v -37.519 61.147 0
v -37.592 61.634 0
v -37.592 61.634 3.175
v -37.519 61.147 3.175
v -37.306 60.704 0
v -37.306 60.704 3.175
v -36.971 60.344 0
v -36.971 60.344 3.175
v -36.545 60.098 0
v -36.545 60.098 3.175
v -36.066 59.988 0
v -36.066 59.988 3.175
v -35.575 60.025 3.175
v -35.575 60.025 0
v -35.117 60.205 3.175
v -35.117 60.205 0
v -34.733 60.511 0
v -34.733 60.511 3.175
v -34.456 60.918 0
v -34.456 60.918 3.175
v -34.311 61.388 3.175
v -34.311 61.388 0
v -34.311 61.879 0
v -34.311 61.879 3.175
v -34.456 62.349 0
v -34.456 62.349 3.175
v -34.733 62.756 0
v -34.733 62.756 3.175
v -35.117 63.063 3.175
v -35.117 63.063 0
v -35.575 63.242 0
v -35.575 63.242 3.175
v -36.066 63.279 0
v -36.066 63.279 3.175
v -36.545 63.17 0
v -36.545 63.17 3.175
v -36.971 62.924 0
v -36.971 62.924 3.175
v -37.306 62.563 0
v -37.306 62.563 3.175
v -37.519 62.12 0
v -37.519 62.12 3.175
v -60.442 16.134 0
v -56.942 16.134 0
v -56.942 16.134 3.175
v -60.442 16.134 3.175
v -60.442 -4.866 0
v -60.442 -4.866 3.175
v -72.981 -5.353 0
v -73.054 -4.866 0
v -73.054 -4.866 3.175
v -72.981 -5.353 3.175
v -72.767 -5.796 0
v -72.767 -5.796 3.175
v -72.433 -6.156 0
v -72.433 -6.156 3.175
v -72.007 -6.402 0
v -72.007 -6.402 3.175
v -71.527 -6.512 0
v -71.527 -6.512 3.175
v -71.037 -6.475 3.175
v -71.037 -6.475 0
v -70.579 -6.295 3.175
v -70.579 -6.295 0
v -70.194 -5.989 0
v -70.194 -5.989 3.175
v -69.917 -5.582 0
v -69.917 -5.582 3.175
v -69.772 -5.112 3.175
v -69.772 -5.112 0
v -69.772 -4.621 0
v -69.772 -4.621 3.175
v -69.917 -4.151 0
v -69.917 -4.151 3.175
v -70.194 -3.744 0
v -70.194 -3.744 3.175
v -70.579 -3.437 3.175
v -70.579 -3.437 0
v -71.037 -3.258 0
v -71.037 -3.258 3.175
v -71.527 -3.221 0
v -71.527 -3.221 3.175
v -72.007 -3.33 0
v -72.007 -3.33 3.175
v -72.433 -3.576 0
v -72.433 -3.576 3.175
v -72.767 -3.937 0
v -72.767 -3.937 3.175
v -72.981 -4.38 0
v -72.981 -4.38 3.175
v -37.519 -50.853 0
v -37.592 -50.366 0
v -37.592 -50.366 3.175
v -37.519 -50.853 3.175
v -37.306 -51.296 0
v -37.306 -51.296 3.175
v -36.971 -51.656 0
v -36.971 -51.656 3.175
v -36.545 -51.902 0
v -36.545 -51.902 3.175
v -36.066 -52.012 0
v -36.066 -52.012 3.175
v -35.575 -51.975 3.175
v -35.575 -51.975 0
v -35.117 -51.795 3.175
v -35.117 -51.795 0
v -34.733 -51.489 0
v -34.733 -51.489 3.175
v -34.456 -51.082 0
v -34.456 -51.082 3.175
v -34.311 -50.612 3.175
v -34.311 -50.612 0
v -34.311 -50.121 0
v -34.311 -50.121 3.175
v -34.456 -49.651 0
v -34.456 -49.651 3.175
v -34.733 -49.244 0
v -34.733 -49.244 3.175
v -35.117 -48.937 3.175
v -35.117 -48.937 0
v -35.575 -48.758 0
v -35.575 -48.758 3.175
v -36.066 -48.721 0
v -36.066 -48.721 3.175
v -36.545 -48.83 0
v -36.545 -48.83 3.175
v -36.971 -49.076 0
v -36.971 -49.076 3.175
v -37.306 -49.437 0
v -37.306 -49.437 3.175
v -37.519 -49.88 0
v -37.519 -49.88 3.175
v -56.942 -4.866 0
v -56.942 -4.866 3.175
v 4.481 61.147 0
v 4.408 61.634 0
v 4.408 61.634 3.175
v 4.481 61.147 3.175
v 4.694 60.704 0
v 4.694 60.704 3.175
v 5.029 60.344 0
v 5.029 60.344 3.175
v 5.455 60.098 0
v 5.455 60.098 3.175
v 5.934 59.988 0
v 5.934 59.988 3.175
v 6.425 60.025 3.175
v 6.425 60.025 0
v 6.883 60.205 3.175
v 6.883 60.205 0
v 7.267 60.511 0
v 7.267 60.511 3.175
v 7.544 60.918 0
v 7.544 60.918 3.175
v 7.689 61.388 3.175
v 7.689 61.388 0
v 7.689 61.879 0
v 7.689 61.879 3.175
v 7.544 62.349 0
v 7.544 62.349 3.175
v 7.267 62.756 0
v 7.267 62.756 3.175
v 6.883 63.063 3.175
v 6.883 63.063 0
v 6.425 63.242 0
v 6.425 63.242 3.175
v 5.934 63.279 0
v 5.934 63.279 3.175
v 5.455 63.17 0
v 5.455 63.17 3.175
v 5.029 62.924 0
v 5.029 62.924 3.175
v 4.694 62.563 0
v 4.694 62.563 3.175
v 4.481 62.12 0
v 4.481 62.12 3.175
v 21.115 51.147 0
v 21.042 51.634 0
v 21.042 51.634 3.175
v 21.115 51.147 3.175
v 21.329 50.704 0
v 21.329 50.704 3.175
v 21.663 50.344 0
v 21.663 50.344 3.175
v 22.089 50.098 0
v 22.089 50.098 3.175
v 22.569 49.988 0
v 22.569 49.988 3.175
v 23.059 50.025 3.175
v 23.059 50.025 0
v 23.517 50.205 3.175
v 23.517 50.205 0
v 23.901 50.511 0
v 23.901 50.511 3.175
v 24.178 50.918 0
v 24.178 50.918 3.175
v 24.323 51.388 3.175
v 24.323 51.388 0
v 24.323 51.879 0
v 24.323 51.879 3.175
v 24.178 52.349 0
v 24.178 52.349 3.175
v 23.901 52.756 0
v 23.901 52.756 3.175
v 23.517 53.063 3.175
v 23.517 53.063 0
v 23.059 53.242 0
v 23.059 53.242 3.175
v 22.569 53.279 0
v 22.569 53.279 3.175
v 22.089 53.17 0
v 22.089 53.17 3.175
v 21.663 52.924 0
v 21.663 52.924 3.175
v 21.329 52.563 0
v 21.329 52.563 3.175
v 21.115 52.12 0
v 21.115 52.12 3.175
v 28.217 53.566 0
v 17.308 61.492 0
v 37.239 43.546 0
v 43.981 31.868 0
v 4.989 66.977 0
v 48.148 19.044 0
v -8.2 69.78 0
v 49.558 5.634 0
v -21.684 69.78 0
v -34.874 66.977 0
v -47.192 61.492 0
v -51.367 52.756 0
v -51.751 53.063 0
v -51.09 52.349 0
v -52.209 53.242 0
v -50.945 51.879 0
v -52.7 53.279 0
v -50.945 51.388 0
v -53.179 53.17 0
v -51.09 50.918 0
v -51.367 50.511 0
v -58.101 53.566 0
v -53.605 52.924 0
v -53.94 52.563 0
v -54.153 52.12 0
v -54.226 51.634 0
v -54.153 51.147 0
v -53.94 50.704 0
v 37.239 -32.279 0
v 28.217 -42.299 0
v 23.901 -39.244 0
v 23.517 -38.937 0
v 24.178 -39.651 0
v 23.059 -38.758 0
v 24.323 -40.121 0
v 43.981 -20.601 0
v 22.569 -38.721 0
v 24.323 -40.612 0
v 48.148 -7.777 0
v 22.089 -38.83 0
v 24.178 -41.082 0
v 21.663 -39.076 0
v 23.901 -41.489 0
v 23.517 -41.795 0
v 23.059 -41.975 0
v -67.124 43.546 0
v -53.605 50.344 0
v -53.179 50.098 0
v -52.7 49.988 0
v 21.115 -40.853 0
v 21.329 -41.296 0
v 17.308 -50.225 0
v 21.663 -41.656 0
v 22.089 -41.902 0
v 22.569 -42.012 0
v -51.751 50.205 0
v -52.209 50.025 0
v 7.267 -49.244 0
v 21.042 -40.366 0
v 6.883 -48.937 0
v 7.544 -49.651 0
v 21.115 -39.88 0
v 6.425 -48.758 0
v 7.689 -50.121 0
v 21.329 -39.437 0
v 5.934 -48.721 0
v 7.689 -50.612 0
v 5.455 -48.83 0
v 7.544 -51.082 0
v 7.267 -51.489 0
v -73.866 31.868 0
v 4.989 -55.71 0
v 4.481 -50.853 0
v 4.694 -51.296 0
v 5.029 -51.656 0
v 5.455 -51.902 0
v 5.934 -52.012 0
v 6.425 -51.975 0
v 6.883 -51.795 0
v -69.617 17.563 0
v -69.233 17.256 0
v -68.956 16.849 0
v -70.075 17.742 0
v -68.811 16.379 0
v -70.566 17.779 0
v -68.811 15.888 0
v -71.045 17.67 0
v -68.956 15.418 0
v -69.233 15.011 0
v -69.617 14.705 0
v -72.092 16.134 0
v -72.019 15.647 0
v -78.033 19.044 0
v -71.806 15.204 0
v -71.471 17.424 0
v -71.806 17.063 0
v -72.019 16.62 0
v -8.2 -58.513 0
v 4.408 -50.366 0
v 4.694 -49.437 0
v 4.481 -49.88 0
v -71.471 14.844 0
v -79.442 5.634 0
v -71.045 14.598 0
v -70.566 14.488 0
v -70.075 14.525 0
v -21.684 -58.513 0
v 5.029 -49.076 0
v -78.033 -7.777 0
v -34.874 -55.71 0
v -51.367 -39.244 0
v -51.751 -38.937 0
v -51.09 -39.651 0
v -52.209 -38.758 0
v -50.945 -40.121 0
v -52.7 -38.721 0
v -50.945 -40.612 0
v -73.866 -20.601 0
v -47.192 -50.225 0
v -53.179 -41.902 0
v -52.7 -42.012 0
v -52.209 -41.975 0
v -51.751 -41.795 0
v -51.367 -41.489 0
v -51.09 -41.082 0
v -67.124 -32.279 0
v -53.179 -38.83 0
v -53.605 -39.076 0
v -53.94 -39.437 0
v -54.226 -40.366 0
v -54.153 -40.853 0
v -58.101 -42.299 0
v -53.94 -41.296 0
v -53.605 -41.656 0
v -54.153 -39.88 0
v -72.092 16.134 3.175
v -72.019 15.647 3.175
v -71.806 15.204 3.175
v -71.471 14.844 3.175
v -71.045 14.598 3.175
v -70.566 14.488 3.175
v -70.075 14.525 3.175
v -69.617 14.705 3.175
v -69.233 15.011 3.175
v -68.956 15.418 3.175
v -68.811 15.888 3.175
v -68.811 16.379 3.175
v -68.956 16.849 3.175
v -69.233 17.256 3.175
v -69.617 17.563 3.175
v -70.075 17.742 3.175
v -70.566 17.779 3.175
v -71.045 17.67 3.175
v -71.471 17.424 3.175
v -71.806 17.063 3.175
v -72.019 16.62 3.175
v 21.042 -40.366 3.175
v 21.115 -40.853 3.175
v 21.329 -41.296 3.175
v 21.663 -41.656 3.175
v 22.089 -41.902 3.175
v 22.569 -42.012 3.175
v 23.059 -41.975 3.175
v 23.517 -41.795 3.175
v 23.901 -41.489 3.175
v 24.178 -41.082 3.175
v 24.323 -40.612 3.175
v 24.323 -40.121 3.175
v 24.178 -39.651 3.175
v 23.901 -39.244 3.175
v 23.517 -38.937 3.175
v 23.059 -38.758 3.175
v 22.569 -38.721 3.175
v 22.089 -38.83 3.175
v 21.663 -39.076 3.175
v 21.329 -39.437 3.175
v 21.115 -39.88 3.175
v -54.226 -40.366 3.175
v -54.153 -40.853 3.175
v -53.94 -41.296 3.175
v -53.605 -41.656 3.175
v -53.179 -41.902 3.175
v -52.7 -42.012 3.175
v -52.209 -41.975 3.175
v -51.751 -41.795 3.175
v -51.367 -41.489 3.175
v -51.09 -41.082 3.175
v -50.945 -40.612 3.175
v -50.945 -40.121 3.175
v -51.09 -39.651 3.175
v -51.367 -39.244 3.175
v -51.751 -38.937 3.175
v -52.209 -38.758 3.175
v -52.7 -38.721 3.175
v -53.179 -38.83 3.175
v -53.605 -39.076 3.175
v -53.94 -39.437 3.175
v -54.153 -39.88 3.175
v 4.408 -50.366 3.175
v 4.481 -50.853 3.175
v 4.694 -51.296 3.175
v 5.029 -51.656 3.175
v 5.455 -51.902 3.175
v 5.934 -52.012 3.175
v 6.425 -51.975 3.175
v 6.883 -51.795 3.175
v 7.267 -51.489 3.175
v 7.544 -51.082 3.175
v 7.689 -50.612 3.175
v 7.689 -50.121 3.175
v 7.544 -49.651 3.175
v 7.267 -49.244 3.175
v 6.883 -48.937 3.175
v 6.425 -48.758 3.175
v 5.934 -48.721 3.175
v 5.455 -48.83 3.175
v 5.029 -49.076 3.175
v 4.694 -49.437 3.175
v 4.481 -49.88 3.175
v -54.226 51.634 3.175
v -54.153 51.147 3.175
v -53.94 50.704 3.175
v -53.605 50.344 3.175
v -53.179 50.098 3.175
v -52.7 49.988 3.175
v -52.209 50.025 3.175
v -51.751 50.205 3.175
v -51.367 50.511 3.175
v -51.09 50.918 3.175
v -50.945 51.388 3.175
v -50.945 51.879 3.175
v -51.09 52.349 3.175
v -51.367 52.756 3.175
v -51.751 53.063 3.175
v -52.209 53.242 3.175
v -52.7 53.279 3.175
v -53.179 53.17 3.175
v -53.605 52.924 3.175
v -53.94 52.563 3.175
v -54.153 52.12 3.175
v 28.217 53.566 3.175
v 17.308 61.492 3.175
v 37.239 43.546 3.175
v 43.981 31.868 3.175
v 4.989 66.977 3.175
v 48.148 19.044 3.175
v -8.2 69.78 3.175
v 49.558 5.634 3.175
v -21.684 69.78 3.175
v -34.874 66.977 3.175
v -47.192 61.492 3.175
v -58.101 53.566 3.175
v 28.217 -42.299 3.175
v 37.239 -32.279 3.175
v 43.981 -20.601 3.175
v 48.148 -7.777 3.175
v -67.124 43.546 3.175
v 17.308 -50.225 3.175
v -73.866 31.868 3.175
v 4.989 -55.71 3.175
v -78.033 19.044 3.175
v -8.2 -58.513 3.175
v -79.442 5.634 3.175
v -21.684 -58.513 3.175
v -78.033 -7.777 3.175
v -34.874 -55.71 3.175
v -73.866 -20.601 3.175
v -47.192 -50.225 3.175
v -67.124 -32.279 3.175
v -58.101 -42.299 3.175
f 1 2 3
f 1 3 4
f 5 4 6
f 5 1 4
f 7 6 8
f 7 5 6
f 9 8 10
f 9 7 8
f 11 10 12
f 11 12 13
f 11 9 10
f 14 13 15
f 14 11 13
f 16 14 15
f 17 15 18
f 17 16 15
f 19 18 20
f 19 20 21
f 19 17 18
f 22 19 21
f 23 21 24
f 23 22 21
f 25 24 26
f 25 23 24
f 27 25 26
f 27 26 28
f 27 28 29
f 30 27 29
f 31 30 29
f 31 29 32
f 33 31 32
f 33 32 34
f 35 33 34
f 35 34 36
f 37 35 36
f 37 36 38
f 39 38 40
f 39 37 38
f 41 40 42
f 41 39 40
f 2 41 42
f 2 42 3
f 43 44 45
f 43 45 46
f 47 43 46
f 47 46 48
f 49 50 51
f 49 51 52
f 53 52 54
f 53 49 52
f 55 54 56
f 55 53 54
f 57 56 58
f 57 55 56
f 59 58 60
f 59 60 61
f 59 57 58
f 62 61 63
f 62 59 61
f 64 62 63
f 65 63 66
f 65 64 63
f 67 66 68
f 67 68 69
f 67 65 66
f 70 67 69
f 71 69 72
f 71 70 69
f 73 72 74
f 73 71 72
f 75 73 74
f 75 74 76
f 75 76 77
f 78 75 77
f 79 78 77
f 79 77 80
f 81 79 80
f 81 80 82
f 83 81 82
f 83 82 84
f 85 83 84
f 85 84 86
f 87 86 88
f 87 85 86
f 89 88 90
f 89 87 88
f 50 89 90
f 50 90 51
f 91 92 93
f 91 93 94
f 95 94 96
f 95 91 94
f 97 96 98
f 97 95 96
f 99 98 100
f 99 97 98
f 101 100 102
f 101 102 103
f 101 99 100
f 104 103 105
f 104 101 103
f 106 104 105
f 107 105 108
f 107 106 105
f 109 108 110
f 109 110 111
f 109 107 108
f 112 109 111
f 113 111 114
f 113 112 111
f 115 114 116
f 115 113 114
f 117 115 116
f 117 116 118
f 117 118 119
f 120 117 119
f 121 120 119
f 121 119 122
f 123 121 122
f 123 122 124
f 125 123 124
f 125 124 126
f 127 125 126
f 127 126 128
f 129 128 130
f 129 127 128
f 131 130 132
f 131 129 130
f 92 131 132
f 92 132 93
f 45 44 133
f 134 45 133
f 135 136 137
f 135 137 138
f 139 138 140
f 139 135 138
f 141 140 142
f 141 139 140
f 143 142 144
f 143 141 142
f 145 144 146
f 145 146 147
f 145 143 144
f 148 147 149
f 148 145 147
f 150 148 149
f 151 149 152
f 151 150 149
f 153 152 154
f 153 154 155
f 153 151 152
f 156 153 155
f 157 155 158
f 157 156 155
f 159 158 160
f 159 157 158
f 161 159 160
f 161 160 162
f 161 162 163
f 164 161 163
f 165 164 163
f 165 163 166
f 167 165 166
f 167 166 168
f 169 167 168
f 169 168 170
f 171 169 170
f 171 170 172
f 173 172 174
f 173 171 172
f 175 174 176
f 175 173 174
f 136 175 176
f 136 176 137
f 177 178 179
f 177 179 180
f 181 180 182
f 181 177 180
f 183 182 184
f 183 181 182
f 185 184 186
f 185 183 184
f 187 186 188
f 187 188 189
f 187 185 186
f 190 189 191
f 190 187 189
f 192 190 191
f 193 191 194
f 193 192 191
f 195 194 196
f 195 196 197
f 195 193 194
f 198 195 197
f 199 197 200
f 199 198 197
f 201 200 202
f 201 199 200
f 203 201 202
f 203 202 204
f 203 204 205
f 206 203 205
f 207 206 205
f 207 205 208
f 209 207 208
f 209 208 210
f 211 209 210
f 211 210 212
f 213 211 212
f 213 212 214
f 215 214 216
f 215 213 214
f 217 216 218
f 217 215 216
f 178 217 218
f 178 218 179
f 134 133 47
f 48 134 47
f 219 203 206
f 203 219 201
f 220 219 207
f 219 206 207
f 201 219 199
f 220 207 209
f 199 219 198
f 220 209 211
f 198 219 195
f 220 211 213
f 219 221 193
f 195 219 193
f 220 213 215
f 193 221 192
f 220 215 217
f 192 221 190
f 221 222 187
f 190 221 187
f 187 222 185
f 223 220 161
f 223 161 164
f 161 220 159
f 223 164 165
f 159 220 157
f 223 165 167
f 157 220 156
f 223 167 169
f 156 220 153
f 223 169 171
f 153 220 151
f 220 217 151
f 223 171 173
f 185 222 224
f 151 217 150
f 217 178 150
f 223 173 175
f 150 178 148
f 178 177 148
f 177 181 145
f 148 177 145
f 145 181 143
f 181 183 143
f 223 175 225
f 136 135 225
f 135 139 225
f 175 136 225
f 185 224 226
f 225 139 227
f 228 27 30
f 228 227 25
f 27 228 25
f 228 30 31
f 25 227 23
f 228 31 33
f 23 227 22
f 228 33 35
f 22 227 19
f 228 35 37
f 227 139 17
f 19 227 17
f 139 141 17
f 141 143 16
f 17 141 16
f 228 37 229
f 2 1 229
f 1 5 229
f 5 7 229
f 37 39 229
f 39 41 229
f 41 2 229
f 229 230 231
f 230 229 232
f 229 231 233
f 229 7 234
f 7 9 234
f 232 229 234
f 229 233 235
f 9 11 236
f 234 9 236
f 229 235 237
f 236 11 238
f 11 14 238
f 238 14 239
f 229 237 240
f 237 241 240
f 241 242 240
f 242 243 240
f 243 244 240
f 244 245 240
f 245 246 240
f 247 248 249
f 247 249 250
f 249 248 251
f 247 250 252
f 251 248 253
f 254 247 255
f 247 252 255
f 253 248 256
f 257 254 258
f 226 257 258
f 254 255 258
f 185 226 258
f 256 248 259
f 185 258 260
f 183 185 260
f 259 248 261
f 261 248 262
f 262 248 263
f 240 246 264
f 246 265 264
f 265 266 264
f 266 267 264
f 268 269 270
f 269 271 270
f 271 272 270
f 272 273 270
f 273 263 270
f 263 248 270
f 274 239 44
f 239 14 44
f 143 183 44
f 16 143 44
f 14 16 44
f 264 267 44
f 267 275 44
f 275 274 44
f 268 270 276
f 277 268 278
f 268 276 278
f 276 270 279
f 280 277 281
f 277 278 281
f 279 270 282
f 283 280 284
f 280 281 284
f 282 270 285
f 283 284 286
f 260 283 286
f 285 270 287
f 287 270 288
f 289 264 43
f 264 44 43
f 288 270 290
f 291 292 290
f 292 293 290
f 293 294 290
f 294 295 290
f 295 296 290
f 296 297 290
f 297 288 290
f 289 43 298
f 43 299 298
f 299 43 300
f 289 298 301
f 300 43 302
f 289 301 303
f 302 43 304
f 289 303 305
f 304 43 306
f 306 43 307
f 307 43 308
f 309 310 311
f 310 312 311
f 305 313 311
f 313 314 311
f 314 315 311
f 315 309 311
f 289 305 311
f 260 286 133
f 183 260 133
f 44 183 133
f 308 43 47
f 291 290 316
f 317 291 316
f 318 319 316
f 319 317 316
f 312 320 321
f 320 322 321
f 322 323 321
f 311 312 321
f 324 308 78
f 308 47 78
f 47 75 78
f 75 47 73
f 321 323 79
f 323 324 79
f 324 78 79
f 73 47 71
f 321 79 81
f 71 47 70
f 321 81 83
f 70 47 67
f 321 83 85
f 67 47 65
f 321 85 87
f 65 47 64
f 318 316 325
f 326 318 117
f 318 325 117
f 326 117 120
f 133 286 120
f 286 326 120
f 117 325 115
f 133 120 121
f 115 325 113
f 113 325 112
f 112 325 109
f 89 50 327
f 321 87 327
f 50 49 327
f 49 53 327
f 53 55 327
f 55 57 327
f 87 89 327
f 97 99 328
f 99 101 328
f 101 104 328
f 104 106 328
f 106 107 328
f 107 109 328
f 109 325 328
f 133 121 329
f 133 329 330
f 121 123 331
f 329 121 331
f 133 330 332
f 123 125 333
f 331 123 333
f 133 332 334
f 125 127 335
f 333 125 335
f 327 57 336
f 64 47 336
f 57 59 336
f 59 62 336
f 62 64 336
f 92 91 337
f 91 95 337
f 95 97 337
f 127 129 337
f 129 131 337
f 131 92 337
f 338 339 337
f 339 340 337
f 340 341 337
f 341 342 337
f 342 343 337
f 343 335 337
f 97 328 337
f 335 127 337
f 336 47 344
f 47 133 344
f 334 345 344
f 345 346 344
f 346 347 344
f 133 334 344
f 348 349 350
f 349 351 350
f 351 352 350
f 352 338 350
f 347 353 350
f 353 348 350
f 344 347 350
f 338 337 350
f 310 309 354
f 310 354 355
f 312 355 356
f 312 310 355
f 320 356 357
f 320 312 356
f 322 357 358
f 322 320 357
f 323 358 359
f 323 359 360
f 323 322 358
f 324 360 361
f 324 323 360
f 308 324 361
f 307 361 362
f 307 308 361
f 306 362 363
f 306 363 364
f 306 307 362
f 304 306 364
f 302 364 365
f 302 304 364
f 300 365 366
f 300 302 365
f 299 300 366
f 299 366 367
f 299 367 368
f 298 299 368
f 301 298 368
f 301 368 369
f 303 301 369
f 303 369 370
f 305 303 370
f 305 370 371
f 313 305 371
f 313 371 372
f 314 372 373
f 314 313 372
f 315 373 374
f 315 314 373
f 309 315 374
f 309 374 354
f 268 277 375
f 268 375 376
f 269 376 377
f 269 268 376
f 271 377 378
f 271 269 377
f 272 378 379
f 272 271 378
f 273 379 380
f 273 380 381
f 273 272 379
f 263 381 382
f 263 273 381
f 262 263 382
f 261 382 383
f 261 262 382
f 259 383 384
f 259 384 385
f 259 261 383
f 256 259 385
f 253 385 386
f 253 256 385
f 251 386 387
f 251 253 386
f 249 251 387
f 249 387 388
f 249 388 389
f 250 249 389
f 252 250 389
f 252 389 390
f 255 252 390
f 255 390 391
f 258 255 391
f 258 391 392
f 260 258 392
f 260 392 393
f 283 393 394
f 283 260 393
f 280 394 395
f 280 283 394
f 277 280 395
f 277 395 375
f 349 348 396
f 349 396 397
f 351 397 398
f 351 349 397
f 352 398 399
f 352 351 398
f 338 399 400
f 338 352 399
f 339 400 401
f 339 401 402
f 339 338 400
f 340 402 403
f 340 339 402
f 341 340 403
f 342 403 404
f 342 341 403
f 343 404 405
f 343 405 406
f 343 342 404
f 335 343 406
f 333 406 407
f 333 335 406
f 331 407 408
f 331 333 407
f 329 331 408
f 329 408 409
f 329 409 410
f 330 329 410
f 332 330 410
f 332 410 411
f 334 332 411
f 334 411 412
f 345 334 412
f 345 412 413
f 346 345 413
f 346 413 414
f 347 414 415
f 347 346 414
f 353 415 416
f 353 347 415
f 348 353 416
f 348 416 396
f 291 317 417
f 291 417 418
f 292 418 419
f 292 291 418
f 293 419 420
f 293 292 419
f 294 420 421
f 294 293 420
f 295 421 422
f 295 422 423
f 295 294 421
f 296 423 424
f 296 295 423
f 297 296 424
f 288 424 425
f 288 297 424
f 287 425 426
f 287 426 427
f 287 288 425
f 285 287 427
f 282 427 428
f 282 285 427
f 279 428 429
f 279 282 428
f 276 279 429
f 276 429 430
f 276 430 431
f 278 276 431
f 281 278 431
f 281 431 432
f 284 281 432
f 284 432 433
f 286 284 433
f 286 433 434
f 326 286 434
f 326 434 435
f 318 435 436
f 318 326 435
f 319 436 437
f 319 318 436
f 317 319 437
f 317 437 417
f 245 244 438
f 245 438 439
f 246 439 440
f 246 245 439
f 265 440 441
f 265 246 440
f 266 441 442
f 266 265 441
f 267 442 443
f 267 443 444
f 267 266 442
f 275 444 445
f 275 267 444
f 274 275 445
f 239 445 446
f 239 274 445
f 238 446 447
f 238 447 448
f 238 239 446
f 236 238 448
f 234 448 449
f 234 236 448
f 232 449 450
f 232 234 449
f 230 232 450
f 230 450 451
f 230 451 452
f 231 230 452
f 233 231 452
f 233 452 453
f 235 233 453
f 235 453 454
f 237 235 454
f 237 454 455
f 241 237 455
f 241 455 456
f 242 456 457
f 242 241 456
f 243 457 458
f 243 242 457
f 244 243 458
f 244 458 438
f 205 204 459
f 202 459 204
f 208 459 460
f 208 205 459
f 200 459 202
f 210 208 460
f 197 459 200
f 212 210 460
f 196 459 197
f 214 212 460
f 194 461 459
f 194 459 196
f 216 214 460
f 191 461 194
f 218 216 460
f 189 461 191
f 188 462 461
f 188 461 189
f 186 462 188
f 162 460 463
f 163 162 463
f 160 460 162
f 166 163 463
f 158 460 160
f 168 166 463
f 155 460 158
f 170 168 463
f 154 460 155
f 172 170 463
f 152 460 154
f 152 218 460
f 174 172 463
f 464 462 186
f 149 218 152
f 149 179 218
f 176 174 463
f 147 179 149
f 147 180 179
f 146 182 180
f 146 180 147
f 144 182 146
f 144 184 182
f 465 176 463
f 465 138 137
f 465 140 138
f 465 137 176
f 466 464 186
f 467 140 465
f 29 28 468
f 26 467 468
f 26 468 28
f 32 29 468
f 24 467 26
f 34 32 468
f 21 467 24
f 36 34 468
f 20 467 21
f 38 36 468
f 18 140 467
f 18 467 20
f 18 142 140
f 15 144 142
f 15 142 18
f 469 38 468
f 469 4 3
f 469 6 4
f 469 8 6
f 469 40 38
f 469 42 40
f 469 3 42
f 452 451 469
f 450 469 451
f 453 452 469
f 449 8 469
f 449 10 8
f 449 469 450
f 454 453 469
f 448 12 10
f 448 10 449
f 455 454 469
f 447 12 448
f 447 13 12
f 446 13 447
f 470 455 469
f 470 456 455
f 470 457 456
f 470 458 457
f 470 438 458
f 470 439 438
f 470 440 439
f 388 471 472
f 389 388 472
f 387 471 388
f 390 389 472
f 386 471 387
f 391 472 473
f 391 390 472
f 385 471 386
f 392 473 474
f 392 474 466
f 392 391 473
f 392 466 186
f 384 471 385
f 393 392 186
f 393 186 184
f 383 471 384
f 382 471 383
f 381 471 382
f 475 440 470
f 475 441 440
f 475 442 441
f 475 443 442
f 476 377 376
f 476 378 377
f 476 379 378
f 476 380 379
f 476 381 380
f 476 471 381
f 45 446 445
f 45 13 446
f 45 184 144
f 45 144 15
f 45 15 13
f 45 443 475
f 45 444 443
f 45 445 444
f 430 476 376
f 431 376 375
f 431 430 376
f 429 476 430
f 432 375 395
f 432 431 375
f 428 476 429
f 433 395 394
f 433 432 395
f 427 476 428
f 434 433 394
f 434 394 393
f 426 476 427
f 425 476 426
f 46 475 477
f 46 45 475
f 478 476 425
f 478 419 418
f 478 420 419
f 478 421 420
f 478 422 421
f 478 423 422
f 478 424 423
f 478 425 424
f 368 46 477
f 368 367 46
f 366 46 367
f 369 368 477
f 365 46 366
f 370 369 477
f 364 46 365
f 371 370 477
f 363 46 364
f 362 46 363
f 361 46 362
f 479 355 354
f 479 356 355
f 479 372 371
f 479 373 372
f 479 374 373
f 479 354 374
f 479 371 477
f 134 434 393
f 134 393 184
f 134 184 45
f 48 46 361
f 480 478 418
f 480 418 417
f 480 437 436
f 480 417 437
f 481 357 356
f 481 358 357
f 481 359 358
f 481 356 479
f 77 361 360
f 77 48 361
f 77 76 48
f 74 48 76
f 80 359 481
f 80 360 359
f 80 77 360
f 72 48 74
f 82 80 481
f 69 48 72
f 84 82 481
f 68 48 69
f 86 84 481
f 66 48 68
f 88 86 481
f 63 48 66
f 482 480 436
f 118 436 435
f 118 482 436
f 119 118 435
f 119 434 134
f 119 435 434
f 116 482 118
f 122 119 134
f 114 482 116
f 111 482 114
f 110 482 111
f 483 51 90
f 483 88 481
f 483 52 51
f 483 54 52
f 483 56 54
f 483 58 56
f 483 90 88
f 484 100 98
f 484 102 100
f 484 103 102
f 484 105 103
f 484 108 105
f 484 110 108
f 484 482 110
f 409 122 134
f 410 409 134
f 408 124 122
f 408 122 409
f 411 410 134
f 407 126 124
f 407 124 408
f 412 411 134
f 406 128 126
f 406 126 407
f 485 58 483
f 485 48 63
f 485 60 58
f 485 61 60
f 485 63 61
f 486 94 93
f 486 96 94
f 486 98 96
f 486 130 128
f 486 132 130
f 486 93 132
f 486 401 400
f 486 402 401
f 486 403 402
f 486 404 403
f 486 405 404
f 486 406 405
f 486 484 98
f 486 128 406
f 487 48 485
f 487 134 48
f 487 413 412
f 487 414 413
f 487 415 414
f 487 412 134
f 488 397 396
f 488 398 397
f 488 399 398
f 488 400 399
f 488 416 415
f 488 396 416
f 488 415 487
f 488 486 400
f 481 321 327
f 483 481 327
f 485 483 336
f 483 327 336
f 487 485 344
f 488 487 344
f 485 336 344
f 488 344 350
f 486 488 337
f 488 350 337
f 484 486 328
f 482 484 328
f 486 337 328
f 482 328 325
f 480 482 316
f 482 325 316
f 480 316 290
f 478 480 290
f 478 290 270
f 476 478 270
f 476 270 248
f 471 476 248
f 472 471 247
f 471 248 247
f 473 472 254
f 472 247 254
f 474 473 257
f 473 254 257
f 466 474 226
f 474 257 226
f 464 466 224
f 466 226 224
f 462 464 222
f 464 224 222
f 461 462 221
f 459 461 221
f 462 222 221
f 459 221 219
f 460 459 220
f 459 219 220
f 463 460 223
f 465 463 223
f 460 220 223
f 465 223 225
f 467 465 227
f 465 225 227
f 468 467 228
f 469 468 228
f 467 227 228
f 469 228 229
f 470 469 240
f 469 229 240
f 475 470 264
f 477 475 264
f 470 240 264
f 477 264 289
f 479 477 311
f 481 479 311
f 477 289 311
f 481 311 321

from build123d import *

# Parameters (mm, degrees)
SKETCH1_R           = 64.5
SKETCH1_R_2         = 1.65
SKETCH1_W           = 3.5
SKETCH1_H           = 21
BOSS_EXTRUDE1_DEPTH = 3.175


with BuildPart() as part:
    # Sketch1 → Boss-Extrude1 (new body)
    with BuildSketch(Plane(origin=(0, 0, 0), x_dir=(-1, 0, 0), z_dir=(0, 0, 1))):
        with Locations((14.94226781, -5.633574242)):
            Circle(SKETCH1_R)
        with Locations((-6.05773219, 50.366425758)):
            Circle(SKETCH1_R_2, mode=Mode.SUBTRACT)
        with Locations((-22.69188657, 40.366425758)):
            Circle(SKETCH1_R_2, mode=Mode.SUBTRACT)
        with Locations((35.94226781, 50.366425758)):
            Circle(SKETCH1_R_2, mode=Mode.SUBTRACT)
        with Locations((52.57642219, 40.366425758)):
            Circle(SKETCH1_R_2, mode=Mode.SUBTRACT)
        with Locations((52.57642219, -51.633574242)):
            Circle(SKETCH1_R_2, mode=Mode.SUBTRACT)
        with Locations((35.94226781, -61.633574242)):
            Circle(SKETCH1_R_2, mode=Mode.SUBTRACT)
        with Locations((-6.05773219, -61.633574242)):
            Circle(SKETCH1_R_2, mode=Mode.SUBTRACT)
        with Locations((-22.69188657, -51.633574242)):
            Circle(SKETCH1_R_2, mode=Mode.SUBTRACT)
        with Locations((71.403979127, 4.866425758)):
            Circle(SKETCH1_R_2, mode=Mode.SUBTRACT)
        with Locations((70.44226781, -16.133574242)):
            Circle(SKETCH1_R_2, mode=Mode.SUBTRACT)
        with Locations((58.69226781, -5.633574242)):
            Rectangle(SKETCH1_W, SKETCH1_H, mode=Mode.SUBTRACT)
    extrude(amount=BOSS_EXTRUDE1_DEPTH)


solid = part.part
